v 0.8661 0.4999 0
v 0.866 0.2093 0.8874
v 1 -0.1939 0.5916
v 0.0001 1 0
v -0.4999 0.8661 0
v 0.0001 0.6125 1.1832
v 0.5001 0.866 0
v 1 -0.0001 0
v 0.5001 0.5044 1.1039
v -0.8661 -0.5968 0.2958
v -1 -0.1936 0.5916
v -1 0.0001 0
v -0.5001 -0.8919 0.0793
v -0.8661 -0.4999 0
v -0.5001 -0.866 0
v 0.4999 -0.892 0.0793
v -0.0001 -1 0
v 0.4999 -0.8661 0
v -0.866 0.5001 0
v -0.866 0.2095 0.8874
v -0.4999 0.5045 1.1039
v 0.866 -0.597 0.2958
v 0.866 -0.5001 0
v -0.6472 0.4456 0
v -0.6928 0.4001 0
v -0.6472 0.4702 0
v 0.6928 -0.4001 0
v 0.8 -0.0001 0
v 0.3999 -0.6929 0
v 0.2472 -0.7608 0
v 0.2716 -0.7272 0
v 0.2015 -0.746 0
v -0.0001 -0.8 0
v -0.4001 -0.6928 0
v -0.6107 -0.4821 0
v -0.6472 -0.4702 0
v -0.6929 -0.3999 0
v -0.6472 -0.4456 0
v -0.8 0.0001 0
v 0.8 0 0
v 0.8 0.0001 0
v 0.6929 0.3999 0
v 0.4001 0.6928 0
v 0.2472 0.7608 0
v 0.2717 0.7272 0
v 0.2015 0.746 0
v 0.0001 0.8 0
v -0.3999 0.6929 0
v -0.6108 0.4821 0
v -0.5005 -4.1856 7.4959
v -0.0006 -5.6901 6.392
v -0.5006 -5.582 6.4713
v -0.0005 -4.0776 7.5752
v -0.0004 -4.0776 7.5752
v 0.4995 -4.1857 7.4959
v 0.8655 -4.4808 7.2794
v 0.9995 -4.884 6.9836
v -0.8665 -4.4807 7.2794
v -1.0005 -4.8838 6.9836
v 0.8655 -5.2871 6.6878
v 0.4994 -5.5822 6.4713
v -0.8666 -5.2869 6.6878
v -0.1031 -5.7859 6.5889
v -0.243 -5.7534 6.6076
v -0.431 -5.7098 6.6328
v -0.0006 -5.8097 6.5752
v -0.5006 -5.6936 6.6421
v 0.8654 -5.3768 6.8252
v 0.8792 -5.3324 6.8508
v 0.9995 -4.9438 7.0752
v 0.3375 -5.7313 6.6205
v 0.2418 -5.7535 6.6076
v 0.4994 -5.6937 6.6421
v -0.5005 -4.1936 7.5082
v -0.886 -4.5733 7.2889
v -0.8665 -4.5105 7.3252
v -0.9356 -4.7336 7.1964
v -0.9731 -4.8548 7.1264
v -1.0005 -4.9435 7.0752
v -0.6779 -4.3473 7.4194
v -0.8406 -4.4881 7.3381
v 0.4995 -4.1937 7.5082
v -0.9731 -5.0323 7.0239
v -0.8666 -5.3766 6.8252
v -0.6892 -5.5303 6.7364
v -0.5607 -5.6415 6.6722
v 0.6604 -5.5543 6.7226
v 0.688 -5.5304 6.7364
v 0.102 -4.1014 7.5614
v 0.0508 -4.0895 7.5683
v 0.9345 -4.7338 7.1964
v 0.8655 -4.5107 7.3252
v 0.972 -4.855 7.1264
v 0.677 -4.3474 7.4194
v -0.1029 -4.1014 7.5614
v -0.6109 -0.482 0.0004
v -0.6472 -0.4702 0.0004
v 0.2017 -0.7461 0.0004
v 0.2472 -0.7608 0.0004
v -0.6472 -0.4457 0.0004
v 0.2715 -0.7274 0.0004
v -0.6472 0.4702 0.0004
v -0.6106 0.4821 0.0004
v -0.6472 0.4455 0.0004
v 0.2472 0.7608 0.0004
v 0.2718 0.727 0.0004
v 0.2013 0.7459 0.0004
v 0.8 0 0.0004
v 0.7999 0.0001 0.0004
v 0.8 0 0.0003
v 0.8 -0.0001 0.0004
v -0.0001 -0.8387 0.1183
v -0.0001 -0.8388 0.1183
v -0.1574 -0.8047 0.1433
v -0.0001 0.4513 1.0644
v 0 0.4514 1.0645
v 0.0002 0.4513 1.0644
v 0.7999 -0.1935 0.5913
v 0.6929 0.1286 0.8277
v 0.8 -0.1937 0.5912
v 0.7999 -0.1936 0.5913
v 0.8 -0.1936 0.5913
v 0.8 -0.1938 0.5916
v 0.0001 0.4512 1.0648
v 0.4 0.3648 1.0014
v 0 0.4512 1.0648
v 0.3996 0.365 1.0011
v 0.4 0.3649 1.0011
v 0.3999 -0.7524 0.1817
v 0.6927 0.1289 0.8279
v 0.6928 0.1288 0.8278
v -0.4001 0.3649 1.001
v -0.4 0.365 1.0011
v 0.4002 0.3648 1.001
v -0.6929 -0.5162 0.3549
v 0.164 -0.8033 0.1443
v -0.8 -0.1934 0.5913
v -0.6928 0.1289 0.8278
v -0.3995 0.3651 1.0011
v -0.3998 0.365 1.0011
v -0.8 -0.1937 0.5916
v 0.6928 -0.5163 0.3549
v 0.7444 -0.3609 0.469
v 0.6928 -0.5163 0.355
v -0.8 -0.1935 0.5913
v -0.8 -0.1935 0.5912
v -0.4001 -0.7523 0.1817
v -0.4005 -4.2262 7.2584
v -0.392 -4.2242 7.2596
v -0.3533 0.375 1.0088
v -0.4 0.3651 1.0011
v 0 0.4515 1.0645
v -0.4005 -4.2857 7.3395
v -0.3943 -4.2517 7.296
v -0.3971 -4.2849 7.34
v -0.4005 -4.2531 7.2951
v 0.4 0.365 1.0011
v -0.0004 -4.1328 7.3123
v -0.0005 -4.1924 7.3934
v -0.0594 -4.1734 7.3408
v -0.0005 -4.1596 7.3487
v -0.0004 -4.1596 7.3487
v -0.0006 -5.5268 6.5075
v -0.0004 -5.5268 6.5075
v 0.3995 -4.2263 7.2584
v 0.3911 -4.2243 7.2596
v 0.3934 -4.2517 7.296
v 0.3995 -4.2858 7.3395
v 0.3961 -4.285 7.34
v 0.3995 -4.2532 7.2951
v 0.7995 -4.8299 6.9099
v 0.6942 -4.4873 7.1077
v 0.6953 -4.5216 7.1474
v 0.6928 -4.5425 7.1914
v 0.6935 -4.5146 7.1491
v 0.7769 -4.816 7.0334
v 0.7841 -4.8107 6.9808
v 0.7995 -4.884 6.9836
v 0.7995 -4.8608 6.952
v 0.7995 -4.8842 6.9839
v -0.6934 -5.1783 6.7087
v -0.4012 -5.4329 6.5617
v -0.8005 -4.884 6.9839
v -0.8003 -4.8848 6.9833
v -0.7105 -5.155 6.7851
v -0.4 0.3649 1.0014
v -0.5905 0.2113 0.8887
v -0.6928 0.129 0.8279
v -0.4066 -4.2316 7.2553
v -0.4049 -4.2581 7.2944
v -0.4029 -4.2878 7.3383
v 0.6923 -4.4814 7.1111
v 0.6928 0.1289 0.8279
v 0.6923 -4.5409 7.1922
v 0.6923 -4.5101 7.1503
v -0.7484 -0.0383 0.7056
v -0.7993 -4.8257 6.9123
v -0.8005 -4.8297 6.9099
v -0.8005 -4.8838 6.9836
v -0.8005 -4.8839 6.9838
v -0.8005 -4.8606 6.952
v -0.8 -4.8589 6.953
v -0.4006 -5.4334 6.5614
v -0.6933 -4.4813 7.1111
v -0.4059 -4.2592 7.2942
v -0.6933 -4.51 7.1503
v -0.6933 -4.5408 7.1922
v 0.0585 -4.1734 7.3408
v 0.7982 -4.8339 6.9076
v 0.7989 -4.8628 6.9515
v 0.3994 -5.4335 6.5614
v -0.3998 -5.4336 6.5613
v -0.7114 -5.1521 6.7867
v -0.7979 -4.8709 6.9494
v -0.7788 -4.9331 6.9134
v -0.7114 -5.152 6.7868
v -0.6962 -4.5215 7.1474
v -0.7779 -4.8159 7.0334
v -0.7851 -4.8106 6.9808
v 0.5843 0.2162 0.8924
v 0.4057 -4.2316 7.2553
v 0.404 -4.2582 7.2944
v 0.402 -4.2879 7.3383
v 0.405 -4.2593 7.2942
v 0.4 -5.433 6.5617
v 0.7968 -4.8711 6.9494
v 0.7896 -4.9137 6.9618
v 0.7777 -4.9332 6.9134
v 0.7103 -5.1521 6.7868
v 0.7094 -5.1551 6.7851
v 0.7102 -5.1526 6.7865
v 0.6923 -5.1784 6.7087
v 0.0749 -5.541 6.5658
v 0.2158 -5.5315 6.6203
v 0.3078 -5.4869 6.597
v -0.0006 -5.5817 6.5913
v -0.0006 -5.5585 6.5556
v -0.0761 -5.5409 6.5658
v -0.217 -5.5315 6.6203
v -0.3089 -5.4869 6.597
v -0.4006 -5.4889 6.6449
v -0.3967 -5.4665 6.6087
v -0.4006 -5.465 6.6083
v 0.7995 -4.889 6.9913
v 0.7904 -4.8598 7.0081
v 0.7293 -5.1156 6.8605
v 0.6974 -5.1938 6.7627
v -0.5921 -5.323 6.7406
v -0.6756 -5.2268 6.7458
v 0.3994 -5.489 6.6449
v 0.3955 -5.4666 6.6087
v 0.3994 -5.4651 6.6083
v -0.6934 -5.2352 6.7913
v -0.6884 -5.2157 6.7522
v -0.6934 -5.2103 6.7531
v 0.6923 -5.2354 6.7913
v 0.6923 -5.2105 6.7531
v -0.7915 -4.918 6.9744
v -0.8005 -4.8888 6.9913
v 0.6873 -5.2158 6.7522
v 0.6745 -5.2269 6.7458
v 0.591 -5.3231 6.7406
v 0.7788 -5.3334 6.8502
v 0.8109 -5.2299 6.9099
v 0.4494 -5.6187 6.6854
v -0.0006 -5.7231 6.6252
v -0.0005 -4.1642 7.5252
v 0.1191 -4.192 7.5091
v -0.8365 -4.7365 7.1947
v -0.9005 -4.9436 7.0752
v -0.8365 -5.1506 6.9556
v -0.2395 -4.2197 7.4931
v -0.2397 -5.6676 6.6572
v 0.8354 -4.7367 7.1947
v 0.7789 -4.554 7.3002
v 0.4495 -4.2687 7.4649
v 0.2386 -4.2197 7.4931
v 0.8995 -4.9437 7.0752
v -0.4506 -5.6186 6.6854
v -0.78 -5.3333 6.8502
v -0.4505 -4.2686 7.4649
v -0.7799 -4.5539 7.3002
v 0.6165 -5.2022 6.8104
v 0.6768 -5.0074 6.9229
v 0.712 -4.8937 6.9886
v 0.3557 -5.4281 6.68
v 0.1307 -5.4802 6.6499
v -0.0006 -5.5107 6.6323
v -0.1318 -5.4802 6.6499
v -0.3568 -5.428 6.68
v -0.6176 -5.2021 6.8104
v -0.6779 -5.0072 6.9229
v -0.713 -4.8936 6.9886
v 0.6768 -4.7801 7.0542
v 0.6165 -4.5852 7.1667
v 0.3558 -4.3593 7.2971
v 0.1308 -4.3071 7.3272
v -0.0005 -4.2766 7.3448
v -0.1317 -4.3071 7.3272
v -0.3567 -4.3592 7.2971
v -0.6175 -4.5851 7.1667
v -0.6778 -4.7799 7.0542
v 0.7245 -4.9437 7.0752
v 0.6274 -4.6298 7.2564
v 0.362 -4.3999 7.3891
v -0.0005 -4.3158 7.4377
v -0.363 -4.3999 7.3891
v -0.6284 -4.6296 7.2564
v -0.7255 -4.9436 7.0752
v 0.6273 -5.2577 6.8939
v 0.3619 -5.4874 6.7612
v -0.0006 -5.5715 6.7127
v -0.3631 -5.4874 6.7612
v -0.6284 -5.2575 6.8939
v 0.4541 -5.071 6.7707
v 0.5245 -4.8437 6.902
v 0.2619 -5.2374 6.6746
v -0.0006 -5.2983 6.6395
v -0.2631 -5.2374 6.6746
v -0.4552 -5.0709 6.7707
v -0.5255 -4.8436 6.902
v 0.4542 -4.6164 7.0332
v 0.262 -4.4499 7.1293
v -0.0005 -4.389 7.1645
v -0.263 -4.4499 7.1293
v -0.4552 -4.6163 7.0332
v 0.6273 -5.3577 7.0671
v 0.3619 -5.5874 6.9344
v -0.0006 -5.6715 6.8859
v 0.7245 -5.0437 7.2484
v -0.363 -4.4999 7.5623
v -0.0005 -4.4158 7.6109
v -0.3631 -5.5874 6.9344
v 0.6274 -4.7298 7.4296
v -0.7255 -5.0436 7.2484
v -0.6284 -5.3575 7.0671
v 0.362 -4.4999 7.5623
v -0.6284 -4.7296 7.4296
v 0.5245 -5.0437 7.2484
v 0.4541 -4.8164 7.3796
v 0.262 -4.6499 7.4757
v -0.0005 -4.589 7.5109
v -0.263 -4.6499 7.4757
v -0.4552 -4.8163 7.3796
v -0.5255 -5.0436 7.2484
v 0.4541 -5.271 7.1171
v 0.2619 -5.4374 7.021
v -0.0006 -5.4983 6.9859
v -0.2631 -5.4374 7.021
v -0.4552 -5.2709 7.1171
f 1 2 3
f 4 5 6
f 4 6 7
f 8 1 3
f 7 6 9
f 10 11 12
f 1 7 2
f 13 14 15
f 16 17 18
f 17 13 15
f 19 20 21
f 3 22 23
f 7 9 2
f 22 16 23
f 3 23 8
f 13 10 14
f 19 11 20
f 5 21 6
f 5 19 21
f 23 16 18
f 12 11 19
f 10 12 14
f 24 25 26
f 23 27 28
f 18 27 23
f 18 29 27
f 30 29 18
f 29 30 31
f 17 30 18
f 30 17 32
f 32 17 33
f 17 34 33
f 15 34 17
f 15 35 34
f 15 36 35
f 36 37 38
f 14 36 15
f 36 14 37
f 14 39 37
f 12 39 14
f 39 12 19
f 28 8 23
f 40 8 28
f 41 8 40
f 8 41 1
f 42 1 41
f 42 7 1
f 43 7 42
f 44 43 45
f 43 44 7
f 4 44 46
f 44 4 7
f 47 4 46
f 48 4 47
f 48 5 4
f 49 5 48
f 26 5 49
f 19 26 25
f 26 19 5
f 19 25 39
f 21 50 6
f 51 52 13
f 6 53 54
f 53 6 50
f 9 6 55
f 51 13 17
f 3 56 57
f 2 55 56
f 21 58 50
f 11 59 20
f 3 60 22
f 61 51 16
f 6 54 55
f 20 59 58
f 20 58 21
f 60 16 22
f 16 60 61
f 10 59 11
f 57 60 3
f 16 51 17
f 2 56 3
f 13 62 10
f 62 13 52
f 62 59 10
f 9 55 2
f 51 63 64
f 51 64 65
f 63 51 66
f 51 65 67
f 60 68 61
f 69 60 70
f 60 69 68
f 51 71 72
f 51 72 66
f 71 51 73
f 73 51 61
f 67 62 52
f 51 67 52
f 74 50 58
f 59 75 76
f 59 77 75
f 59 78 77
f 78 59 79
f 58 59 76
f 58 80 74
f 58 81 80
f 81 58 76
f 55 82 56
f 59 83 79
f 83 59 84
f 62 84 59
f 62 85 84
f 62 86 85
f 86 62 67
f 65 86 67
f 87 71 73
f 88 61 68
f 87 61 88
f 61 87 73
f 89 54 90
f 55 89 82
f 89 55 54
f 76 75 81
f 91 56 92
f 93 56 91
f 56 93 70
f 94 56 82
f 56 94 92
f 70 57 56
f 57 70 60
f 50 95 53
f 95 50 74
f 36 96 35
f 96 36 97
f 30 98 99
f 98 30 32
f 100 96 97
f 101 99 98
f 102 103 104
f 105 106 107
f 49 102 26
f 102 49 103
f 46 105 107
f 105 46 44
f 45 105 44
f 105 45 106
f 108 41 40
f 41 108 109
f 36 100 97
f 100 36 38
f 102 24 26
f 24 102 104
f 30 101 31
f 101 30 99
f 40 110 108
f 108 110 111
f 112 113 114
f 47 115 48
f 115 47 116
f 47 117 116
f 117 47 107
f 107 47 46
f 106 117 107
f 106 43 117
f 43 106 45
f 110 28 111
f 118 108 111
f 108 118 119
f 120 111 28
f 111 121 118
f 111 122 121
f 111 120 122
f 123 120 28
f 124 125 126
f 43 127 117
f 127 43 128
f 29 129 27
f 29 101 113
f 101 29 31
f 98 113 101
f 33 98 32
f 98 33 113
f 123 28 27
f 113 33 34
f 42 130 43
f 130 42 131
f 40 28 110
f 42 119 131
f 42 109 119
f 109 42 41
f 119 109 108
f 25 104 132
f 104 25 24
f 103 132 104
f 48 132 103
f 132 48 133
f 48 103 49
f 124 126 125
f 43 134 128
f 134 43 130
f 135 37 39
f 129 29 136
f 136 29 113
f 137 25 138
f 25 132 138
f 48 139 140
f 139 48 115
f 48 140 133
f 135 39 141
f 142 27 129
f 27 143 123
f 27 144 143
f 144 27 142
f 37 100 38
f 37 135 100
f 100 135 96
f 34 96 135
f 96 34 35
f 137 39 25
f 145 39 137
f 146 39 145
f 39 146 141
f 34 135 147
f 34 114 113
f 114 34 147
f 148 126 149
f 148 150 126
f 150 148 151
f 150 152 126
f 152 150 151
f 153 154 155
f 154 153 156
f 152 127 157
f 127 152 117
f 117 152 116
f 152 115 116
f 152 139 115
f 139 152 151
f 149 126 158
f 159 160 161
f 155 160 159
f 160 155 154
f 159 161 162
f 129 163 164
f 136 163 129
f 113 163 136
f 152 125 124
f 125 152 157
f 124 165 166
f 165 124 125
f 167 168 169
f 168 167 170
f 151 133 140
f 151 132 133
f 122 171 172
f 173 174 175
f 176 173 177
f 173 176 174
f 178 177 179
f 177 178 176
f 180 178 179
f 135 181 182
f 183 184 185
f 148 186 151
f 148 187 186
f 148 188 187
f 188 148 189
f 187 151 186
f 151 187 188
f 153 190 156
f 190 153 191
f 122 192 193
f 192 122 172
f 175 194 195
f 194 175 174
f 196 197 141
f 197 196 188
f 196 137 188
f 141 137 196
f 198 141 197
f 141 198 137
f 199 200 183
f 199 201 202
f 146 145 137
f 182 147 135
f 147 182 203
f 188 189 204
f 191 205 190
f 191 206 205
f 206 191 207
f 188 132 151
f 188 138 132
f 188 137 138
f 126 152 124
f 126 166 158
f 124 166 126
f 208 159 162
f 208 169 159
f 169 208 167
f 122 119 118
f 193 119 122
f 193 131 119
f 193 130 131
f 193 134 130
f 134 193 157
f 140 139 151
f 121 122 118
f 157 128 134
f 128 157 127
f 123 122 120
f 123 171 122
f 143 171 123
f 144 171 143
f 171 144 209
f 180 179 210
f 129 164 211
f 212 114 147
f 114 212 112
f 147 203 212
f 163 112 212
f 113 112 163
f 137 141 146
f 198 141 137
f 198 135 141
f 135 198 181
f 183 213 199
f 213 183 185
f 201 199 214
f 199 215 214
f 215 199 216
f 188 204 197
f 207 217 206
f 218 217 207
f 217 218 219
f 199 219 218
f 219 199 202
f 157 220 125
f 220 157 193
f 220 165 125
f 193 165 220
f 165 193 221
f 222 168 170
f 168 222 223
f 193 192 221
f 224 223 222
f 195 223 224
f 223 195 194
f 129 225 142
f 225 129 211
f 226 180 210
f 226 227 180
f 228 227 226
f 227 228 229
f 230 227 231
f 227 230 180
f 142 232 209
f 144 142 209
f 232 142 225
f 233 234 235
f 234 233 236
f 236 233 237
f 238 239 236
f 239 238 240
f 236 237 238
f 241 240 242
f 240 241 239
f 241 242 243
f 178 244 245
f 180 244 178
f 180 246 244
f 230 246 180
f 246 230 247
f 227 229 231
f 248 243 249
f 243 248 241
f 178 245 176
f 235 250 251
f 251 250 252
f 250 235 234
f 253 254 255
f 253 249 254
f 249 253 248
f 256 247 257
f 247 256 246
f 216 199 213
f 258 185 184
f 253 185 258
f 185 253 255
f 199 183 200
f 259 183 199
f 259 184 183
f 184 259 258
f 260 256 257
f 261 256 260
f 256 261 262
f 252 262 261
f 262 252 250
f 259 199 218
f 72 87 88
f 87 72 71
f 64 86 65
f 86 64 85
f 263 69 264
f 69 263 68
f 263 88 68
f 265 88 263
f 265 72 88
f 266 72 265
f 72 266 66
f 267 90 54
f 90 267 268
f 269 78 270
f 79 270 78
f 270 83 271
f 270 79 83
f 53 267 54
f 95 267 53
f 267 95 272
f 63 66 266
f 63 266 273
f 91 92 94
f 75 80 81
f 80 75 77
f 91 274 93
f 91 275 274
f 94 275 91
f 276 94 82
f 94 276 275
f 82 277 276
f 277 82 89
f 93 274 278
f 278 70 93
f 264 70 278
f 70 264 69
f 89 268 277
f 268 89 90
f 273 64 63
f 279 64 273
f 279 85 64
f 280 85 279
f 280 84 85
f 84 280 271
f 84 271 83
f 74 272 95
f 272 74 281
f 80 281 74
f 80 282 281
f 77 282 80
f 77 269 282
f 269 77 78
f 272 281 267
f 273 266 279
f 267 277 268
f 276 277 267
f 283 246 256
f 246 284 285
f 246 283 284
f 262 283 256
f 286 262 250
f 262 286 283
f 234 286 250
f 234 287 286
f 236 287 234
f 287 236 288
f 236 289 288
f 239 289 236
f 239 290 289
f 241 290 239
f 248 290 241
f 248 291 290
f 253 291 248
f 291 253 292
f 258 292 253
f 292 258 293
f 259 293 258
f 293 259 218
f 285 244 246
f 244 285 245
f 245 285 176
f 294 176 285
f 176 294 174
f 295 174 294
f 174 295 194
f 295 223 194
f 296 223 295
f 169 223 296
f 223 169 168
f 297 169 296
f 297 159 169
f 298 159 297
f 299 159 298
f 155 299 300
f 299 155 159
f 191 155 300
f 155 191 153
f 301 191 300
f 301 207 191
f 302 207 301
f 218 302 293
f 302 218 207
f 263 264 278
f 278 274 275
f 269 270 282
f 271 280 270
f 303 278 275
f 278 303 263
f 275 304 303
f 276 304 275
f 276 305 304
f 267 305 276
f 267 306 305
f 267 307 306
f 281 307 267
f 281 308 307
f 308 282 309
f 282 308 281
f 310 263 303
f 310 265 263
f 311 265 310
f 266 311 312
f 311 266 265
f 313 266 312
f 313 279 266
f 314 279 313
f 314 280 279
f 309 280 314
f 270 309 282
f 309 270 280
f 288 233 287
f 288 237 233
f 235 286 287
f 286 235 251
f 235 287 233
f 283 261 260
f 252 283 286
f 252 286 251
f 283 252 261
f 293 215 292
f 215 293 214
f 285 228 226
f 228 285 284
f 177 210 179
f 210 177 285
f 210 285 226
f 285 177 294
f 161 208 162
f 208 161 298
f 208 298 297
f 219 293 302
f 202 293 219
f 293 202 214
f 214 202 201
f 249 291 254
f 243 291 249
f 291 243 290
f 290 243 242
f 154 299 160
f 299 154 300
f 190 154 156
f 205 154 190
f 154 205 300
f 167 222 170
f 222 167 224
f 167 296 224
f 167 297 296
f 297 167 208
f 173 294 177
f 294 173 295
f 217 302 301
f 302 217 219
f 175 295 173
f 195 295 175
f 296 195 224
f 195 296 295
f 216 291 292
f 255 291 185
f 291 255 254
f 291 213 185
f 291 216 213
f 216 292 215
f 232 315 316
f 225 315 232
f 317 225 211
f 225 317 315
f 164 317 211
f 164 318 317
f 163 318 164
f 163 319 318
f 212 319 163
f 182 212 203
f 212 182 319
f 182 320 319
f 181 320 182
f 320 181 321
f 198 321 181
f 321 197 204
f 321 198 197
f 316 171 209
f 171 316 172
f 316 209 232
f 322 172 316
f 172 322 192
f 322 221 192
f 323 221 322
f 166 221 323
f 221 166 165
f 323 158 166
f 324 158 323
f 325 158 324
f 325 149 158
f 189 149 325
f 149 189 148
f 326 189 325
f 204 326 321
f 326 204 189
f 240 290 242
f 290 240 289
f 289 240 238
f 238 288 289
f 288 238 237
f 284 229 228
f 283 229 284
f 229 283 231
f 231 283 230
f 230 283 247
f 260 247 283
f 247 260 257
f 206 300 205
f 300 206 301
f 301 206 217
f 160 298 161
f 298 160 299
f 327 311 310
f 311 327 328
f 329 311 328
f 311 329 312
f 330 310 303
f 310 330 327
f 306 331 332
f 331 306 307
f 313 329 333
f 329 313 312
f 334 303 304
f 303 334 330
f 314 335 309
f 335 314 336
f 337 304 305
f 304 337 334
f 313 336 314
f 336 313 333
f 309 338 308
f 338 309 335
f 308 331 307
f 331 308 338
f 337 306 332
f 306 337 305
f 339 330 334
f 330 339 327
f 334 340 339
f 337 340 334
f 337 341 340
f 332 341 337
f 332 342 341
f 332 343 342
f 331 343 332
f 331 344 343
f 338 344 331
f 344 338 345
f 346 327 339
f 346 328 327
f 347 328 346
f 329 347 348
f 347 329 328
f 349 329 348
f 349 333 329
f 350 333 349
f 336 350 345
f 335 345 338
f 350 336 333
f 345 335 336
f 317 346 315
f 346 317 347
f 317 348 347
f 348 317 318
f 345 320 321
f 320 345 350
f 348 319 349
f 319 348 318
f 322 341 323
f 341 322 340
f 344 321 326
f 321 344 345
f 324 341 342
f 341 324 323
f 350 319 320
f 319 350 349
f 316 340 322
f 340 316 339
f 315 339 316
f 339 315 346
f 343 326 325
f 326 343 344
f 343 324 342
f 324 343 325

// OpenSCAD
tolerance=0.075;
hole_radius=0.05;
grid_hole_radius=0.05;
outer_radius=1;
thickness=0.2;
hole_attach_height=0.05;
attach_thickness=0.1;

//parameters that don't have to be defined explicitly
eps = tolerance/100;
inner_radius = outer_radius - thickness;
fn = 12;
fnh = 6;

module angled_cylinder(angle_deg_y, _h, _r, angle_deg_x = 0) {
    rotate([angle_deg_x, angle_deg_y, 0]) { // Rotate the cylinder 
            cylinder(h = _h, r = _r, center = true, $fn = fnh);
        }
}

module hole(_h) {
    cylinder(h = _h, r = grid_hole_radius, $fn = fnh);
}

//makes circle of holes
module circular_grid(_h, _r, _n) {
    for (i = [0:_n-1]) {
        angle = i * 360 / _n;
        x_pos = _r * cos(angle);
        y_pos = _r * sin(angle);
        translate([x_pos, y_pos, -eps]) {
            hole(_h);
        }
    }
}

//makes grid of holes
module hole_grid(hole_height, grid_h) {
    translate([0,0,hole_height]) {
        difference() {
            //cylinder
            cylinder(h = grid_h, r = (inner_radius + outer_radius)/2, 
                center=false, $fn = fn);
            //holes
            for (i = [0 : grid_hole_radius * 2 + hole_attach_height : inner_radius - grid_hole_radius * 2]) {
                circular_grid(grid_h + eps*2, i, ceil(6.28*i/(grid_hole_radius*4)));
            }
            
        } 
    }
}

//makes curve of CSC
module curve(_radius, _twist, _turning_angle, _turning_radius) {
    rotate([90,0,_twist])
    translate([-_turning_radius, 0, 0])
    rotate_extrude(angle=_turning_angle, convexity=100, $fn = fn)
    translate([_turning_radius, 0]) circle(_radius);
}

module CSC(_r, _t1, _ta1, _tr1, _h, _t2, _ta2, _tr2, is_inner) {
    
    if (_ta1 > 90) {
        CSC(_r, _t1, 90, _tr1, 0, 0, 0, 0, is_inner);
        
        pos1 = (-_tr1 + sqrt(_tr1*_tr1 - pow(_tr1,2)));
        translate([pos1*cos(_t1),pos1*sin(_t1),_tr1])
        rotate([0,-90,_t1])
        CSC(_r, 0, _ta1 - 90, _tr1, _h, _t2, _ta2, _tr2, is_inner);
    } else if (_ta2 > 90) {
        CSC(_r, _t1, _ta1, _tr1, _h, _t2, 90, _tr2, is_inner);
        
        pos1 = (-_tr1 + sqrt(_tr1*_tr1 - pow(_tr1*sin(_ta1),2)));
        pos2 = (-_tr2 + sqrt(_tr2*_tr2 - pow(_tr2,2)));
        translate([pos1*cos(_t1),pos1*sin(_t1),_tr1*sin(_ta1)])
        rotate([0,-_ta1,_t1])
        translate([0, 0, _h])
        translate([pos2*cos(_t2),pos2*sin(_t2),_tr2])
        rotate([0,-90,_t2])
        CSC(_r, 0, 0, 0, 0, 0, _ta2 - 90, _tr2, is_inner);
    } else {
        //intermediate positions
        pos1 = (-_tr1 + sqrt(_tr1*_tr1 - pow(_tr1*sin(_ta1),2)));
        pos2 = (-_tr2 + sqrt(_tr2*_tr2 - pow(_tr2*sin(_ta2),2)));
        
        union() {
            //bottom shell threshold
            if (is_inner) {
                cylinder(h=eps, r=_r, center=true);
            }
            
            //first curve of CSC
            curve(_r, _t1, _ta1, _tr1);
            
            //straight link of CSC
            translate([pos1*cos(_t1),pos1*sin(_t1),_tr1*sin(_ta1)])
            rotate([0,-_ta1,_t1])
            if (is_inner) {
                //add threshold for shelling
                translate([0,0,-eps /2])
                cylinder(h=_h + eps,r=_r, center = false, $fn= fn);
            } else {
                cylinder(h=_h,r=_r, center = false, $fn= fn);
            }
            
            //second curve of CSC
            translate([pos1*cos(_t1),pos1*sin(_t1),_tr1*sin(_ta1)])
            rotate([0,-_ta1,_t1])
            translate([0, 0, _h])
            curve(_r, _t2, _ta2, _tr2);
            
            //shelling thresholds
            if (is_inner) {
                translate([pos1*cos(_t1),pos1*sin(_t1),_tr1*sin(_ta1)])
                rotate([0,-_ta1,_t1])
                translate([0, 0, _h])
                translate([pos2*cos(_t2),pos2*sin(_t2),_tr2*sin(_ta2)])
                rotate([0,-_ta2,_t2]) {
                    cylinder(h=eps, r=_r, center=true,$fn=fn);
                }
            
            }
        }
    }
    
}

//allow modules to attach
module CSC_ATTACH(_r, _t1, _ta1, _tr1, _h, _t2, _ta2, _tr2, next_hole_radius, next_hole_attach_height, next_inner) {
    
    if (_ta1 > 90) {        
        pos1 = (-_tr1 + sqrt(_tr1*_tr1 - pow(_tr1,2)));
        translate([pos1*cos(_t1),pos1*sin(_t1),_tr1])
        rotate([0,-90,_t1])
        CSC_ATTACH(_r, 0, _ta1 - 90, _tr1, _h, _t2, _ta2, _tr2, next_hole_radius, next_hole_attach_height, next_inner);
    } else if (_ta2 > 90) {        
        pos1 = (-_tr1 + sqrt(_tr1*_tr1 - pow(_tr1*sin(_ta1),2)));
        pos2 = (-_tr2 + sqrt(_tr2*_tr2 - pow(_tr2,2)));
        translate([pos1*cos(_t1),pos1*sin(_t1),_tr1*sin(_ta1)])
        rotate([0,-_ta1,_t1])
        translate([0, 0, _h])
        translate([pos2*cos(_t2),pos2*sin(_t2),_tr2])
        rotate([0,-90,_t2])
        CSC_ATTACH(_r, 0, 0, 0, 0, 0, _ta2 - 90, _tr2, next_hole_radius, next_hole_attach_height, next_inner);
    } else {
        //intermediate positions
        pos1 = (-_tr1 + sqrt(_tr1*_tr1 - pow(_tr1*sin(_ta1),2)));
        pos2 = (-_tr2 + sqrt(_tr2*_tr2 - pow(_tr2*sin(_ta2),2)));
        
        translate([pos1*cos(_t1),pos1*sin(_t1),_tr1*sin(_ta1)])
        rotate([0,-_ta1,_t1])
        translate([0, 0, _h])
        translate([pos2*cos(_t2),pos2*sin(_t2),_tr2*sin(_ta2)])
        rotate([0,-_ta2,_t2]) {
            difference() {
                union() {
                    //attachment for smaller cylinder
                    translate([0,0,-attach_thickness])
                    cylinder(h=attach_thickness, r=_r - thickness/2, $fn=fn);
                    translate([0,0,-attach_thickness*2])
                    cylinder(h=attach_thickness*2, r1=_r - thickness/2, r2=next_inner - tolerance - thickness, $fn=fn);
                    
                    //small cylinder
                    cylinder(h=next_hole_radius*2 + next_hole_attach_height * 2, r = next_inner - tolerance, $fn=fn);
                }
                
                //shelling
                translate([0,0, -attach_thickness*2 - eps/2])
                cylinder(h=next_hole_radius*2 + next_hole_attach_height * 2 + attach_thickness*2 + eps, r = min(inner_radius, next_inner - tolerance - thickness), $fn=fn);
                
                //holes for screws
    //            translate([0,0,next_hole_attach_height + next_hole_radius]) {
    //                angled_cylinder(0, (next_inner + thickness + eps) * 2,  hole_radius, 90);
    //                angled_cylinder(90, (next_inner + thickness + eps) * 2, hole_radius, 0);
    //            }
            }
        }
    }
}

//remove overlap to allow all branches to attach to each other
module CSC_REMOVE_OVERLAP(_r, _t1, _ta1, _tr1, _h, _t2, _ta2, _tr2, next_hole_radius, next_hole_attach_height, next_inner) {
    if (_ta1 > 90) {        
        pos1 = (-_tr1 + sqrt(_tr1*_tr1 - pow(_tr1,2)));
        translate([pos1*cos(_t1),pos1*sin(_t1),_tr1])
        rotate([0,-90,_t1])
        CSC_REMOVE_OVERLAP(_r, 0, _ta1 - 90, _tr1, _h, _t2, _ta2, _tr2, next_hole_radius, next_hole_attach_height, next_inner);
    } else if (_ta2 > 90) {        
        pos1 = (-_tr1 + sqrt(_tr1*_tr1 - pow(_tr1*sin(_ta1),2)));
        pos2 = (-_tr2 + sqrt(_tr2*_tr2 - pow(_tr2,2)));
        translate([pos1*cos(_t1),pos1*sin(_t1),_tr1*sin(_ta1)])
        rotate([0,-_ta1,_t1])
        translate([0, 0, _h])
        translate([pos2*cos(_t2),pos2*sin(_t2),_tr2])
        rotate([0,-90,_t2])
        CSC_REMOVE_OVERLAP(_r, 0, 0, 0, 0, 0, _ta2 - 90, _tr2, next_hole_radius, next_hole_attach_height, next_inner);
    } else {
        pos1 = (-_tr1 + sqrt(_tr1*_tr1 - pow(_tr1*sin(_ta1),2)));
        pos2 = (-_tr2 + sqrt(_tr2*_tr2 - pow(_tr2*sin(_ta2),2)));
        
        translate([pos1*cos(_t1),pos1*sin(_t1),_tr1*sin(_ta1)])
        rotate([0,-_ta1,_t1])
        translate([0, 0, _h])
        translate([pos2*cos(_t2),pos2*sin(_t2),_tr2*sin(_ta2)])
        rotate([0,-_ta2,_t2]) {
            cylinder(h=999999, r=_r + tolerance, $fn=fn);
        }
    }
}

//c is _t1, _ta1, _tr1, _h, _t2, _ta2, _tr2, next hole radius, next hole height, next inner radius
module branch(branch_list, _outer, _inner) {
    union() {
        //make grid of holes
        //hole_grid(hole_radius*2 + hole_attach_height * 2, grid_hole_radius);
        
        //make CSC shells for each CSC in branch_list
        difference() {
            for (c = branch_list) {
                CSC(_outer,c[0],c[1],c[2],c[3],c[4],c[5],c[6], false);
            }
            
            for (c = branch_list) {
                CSC(_inner,c[0],c[1],c[2],c[3],c[4],c[5],c[6], true);
                CSC_REMOVE_OVERLAP(_outer,c[0],c[1],c[2],c[3],c[4],c[5],c[6],c[7], c[8], c[9]);
            }
            
            //make screw holes at the bottom
//            translate([0,0,hole_radius + hole_attach_height]) {
//                angled_cylinder(0, (outer_radius*1.5 + eps) * 2,  hole_radius, 90);
//                angled_cylinder(90, (outer_radius*1.5 + eps) * 2, hole_radius, 0);
//            }    
        }
        for (c=branch_list) {     
            CSC_ATTACH(_outer,c[0],c[1],c[2],c[3],c[4],c[5],c[6], c[7], c[8], c[9]);
        }
    }
}

branch([
[ 89.9938, 36.2693, 1.0*outer_radius, 7.9281*outer_radius, -180.0, 6.2693, 1.0*outer_radius, 0.05, 0.05, 0.8],
],outer_radius,inner_radius);
